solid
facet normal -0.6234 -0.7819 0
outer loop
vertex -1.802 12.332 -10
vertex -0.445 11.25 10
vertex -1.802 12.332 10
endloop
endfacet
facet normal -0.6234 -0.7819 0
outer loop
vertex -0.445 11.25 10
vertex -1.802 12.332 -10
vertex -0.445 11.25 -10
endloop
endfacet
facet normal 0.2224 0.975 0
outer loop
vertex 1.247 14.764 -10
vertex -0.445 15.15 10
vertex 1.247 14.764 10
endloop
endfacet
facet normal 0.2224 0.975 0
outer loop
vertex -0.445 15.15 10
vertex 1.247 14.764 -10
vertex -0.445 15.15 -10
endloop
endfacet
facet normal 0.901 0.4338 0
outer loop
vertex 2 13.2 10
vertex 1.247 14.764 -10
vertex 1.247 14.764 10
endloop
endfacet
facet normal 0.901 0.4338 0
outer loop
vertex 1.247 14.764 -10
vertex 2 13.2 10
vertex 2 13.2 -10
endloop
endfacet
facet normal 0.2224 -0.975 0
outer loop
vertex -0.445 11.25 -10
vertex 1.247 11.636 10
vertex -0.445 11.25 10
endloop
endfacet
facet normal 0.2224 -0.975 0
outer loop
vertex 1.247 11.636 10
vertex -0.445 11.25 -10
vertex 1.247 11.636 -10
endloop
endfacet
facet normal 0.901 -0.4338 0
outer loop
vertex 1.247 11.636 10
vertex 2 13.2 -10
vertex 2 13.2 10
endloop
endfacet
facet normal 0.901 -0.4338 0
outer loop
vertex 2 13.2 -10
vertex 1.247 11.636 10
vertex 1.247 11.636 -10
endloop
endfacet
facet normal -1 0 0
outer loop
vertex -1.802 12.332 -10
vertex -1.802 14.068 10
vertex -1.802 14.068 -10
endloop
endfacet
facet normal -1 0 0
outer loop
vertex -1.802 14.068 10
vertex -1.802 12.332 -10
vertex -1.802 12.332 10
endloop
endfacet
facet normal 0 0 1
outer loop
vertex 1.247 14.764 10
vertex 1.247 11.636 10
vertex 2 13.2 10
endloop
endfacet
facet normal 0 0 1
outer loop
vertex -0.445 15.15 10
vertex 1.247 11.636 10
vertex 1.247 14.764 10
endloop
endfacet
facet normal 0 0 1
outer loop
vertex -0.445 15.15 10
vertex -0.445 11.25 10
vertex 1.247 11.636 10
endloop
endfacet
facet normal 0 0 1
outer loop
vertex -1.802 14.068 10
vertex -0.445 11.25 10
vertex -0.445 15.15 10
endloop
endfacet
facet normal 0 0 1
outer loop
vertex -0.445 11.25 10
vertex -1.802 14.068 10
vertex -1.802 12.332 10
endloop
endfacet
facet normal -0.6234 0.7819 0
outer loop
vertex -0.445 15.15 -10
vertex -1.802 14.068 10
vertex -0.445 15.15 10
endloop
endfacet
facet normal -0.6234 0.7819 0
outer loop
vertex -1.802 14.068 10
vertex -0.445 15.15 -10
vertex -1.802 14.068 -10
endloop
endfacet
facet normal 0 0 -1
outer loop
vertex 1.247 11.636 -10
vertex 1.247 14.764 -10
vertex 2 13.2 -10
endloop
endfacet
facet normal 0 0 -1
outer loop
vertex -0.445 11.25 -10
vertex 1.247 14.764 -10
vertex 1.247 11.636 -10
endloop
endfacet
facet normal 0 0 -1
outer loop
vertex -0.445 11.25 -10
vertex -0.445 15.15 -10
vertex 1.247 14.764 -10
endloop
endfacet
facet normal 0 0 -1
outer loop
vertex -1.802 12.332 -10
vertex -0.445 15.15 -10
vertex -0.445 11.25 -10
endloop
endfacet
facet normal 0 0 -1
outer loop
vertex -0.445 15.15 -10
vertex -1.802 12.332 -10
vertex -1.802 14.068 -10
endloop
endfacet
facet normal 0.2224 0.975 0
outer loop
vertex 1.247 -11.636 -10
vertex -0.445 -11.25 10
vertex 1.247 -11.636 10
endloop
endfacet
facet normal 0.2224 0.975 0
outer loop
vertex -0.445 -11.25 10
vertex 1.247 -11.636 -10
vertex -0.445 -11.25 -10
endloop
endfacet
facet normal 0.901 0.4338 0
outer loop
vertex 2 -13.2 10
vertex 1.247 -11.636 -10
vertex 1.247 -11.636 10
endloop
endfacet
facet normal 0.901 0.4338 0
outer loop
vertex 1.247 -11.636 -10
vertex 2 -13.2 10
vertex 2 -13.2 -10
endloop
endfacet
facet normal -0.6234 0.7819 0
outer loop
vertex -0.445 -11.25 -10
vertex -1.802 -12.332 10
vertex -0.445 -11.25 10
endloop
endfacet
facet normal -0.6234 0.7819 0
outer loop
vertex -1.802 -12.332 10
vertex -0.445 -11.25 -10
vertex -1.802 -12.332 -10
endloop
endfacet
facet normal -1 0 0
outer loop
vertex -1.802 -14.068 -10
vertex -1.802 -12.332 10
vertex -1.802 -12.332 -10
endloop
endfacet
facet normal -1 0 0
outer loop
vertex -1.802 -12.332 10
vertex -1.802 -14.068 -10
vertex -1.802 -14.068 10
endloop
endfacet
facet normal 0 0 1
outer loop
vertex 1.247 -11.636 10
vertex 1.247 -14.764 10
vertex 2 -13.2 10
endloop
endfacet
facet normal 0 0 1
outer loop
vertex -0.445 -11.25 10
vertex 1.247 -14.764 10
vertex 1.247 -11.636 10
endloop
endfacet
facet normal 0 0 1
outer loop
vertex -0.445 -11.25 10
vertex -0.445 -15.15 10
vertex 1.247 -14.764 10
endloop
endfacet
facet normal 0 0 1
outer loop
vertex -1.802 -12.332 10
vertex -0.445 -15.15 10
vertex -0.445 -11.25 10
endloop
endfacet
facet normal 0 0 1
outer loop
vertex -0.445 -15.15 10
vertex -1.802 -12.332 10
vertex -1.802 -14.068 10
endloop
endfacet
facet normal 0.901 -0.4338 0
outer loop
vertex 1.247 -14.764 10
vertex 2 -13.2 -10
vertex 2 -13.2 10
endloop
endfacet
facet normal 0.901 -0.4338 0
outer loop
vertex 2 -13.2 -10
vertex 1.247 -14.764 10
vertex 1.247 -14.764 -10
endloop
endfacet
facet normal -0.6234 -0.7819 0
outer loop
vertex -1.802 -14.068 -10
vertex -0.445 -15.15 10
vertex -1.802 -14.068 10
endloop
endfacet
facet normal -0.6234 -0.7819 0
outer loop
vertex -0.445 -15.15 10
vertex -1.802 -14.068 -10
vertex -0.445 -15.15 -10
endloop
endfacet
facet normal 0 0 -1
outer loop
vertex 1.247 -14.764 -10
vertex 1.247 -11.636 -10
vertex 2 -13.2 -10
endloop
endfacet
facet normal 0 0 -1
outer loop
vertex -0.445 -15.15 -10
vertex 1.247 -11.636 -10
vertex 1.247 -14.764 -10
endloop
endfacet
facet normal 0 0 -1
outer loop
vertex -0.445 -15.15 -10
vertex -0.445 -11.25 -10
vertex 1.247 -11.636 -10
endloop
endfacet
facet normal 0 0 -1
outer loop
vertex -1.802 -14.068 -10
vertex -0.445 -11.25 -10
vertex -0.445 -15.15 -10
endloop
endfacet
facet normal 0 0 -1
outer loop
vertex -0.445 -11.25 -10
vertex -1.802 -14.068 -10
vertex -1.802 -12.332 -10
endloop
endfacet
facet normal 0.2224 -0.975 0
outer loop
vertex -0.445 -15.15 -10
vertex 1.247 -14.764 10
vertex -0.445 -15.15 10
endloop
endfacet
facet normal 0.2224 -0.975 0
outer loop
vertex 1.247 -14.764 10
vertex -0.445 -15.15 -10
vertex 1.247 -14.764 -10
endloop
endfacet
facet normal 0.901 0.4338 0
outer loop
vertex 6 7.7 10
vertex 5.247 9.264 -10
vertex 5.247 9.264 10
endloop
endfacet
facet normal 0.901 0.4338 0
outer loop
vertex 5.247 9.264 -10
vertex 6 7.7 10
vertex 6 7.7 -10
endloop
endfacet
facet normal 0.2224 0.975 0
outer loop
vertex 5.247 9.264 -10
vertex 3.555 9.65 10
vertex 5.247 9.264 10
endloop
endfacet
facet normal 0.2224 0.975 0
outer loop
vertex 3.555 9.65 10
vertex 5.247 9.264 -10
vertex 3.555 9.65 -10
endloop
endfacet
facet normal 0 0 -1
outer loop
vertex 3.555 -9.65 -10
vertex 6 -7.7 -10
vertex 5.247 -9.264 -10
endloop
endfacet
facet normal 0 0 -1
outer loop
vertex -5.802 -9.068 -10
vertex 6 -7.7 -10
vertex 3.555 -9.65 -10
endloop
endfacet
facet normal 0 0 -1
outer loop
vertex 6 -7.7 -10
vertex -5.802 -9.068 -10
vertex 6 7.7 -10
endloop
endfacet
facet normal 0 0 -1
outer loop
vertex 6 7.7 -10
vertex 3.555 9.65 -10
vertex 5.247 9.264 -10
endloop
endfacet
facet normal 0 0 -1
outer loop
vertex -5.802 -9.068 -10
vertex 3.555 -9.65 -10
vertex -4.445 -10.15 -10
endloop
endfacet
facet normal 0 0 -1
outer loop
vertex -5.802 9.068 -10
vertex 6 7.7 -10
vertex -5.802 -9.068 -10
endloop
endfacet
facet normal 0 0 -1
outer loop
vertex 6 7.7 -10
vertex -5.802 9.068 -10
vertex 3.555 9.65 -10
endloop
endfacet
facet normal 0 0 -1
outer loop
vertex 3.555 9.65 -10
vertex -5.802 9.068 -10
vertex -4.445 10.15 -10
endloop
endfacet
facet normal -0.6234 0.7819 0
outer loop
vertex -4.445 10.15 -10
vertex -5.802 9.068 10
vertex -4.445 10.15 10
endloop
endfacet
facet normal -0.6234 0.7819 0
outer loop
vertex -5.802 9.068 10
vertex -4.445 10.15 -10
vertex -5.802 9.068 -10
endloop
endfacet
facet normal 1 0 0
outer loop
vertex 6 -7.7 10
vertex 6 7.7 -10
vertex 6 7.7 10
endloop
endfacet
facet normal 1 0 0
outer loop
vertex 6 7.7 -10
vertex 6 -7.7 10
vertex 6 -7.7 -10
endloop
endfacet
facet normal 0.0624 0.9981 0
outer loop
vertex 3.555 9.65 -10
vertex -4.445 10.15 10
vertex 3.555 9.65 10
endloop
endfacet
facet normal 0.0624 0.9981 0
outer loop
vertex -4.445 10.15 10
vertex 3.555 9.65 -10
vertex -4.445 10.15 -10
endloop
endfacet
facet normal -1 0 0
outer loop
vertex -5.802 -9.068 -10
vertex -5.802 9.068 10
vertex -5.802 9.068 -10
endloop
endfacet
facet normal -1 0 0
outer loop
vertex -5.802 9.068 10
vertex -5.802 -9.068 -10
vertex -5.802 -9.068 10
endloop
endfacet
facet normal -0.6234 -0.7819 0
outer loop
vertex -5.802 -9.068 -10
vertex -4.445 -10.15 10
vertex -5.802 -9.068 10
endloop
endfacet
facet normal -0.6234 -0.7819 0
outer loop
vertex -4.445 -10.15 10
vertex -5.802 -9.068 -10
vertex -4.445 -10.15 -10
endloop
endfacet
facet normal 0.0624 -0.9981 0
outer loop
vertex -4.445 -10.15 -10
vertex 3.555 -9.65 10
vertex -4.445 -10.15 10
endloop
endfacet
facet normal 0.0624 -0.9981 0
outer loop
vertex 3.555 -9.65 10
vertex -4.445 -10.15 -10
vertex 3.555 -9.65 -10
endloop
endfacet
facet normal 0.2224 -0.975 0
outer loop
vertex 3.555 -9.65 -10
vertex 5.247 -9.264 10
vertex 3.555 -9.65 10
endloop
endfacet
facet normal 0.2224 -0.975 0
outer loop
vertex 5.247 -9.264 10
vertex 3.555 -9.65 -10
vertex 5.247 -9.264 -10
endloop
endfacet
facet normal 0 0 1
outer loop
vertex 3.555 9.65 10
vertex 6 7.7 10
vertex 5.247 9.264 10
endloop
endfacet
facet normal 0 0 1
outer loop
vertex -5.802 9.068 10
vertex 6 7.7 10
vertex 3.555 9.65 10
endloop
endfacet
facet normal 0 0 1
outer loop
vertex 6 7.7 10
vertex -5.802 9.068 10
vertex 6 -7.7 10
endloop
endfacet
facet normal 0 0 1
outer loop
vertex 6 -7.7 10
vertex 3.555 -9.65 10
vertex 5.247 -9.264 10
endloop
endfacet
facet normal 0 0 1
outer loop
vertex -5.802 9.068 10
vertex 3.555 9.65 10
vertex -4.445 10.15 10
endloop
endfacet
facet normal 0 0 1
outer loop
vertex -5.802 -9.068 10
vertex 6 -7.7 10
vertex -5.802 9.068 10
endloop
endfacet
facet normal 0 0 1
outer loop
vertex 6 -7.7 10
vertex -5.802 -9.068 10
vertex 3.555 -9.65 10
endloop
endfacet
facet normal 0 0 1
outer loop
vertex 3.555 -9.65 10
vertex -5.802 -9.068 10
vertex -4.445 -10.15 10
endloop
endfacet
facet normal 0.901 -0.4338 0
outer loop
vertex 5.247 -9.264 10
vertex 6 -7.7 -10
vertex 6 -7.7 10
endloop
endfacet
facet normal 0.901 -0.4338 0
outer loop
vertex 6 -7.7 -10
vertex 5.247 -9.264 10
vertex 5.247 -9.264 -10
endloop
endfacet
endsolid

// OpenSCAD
// preview[view:north east, tilt:top]


/* [Cutout] */

// Type of cut out
dbType = "DB09"; //[DB09, VGA, DB15, DB25]

// Screw hole type
ScrewHoleType = "HOLE"; //[HOLE, SLOT, BigSlot]

// Cutout Heigth
CutoutHeight = 20; //[1:50]

/* [Options] */

// Genrate Cutout
GenerateDbCutout = "Yes"; //[Yes, No]

// Tiedown Support Pins. Normaly you will want to generate these seperate from the cutout.
GenerateSupportPins = "No"; //[Yes, No]

// Tie Down straps. Normaly you will generate these on there own.
GenerateTieDownSraps = "No"; //[Yes, No]

cutoutDB(dbType, ScrewHoleType, GenerateDbCutout, GenerateSupportPins);

/* [About] */
// This is meant to be a library for DB and DE connectors. If you have any sugestion feel free to send me a message.
About = ""; //[]





/* [Hidden] */

//$fn=40;


//
// inType DB09,15,25,VGA
//
// inScrewHoleType HOLE, SLOT
//



/*
cutoutDB09vga("SLOT");
translate([15,0,0]) cutoutDB09vga("HOLE");

translate([30,0,0]) cutoutDB15("SLOT");
translate([45,0,0]) cutoutDB15("HOLE");

translate([60,0,0]) cutoutDB25("SLOT");
translate([75,0,0]) cutoutDB25("HOLE");

*/

if(GenerateTieDownSraps == "Yes"){
	holdDownStraps();
}
module cutoutDB(inType, inScrewHoleType, wGenerateDbCutout, wGenerateSupportPins){
	
	//wGenerateDbCutout = "" ? "Yes" : "No" ;
	//wGenerateSupportPins = "" ? "No" : "Yes" ;
	
	if(inType == "DB09" || inType == "VGA"){
		cutoutDB09vga(inScrewHoleType, wGenerateDbCutout, wGenerateSupportPins);
	} else if(inType == "DB15"){
		cutoutDB15(inScrewHoleType, wGenerateDbCutout, wGenerateSupportPins);
	} else if(inType == "DB25"){
		cutoutDB25(inScrewHoleType, wGenerateDbCutout, wGenerateSupportPins);
	}
}

module cutoutDB09vga(inScreewHoleType, wGenerateDbCutout, wGenerateSupportPins){
	holeWidth = 8.2;
	HoleHeight = 4;	
	cutoutDBx(holeWidth, HoleHeight, inScreewHoleType, wGenerateDbCutout, wGenerateSupportPins);
}
module cutoutDB15(inScreewHoleType, wGenerateDbCutout, wGenerateSupportPins){
	holeWidth = 16;
	HoleHeight = 4;	
	cutoutDBx(holeWidth, HoleHeight, inScreewHoleType, wGenerateDbCutout, wGenerateSupportPins);
}
module cutoutDB25(inScreewHoleType, wGenerateDbCutout, wGenerateSupportPins){
	holeWidth = 19.6;
	HoleHeight = 4;	
	cutoutDBx(holeWidth, HoleHeight, inScreewHoleType, wGenerateDbCutout, wGenerateSupportPins);
}
module cutoutDBx(inHoleWidth, inHoleHeight, inScreewHoleType, wGenerateDbCutout, wGenerateSupportPins){
	screwHoleWidth = inHoleWidth + 5;
	if(wGenerateDbCutout == "Yes"){
		hull(){
			translate([-inHoleHeight, inHoleWidth,  		0]) cylinder(h = CutoutHeight, d = 4, center = true); // upper right
			translate([-inHoleHeight, -inHoleWidth, 		0]) cylinder(h = CutoutHeight, d = 4, center = true); // upper left
			translate([inHoleHeight,  inHoleWidth  -.5, 0]) cylinder(h = CutoutHeight, d = 4, center = true); // lower right
			translate([inHoleHeight,  -inHoleWidth +.5, 0]) cylinder(h = CutoutHeight, d = 4, center = true); // lower left
		}
		holeDiamiter = 4;
		if(inScreewHoleType == "HOLE"){
			translate([0,  screwHoleWidth,0]) cylinder(h = CutoutHeight, d = holeDiamiter, center = true);
			translate([0, -screwHoleWidth,0]) cylinder(h = CutoutHeight, d = holeDiamiter, center = true);
		} else if(inScreewHoleType == "SLOT"){
			holeDiamiter = 4 ;
			hull(){
				translate([0,  screwHoleWidth,0]) cylinder(h = CutoutHeight, d = holeDiamiter, center = true);
				translate([0, -screwHoleWidth,0]) cylinder(h = CutoutHeight, d = holeDiamiter, center = true);
			}
		}	else {
			holeDiamiter = 6 ;
			hull(){
				translate([0,  screwHoleWidth,0]) cylinder(h = CutoutHeight, d = holeDiamiter, center = true);
				translate([0, -screwHoleWidth,0]) cylinder(h = CutoutHeight, d = holeDiamiter, center = true);
			}	
		}
	}
	placeSupportPins(screwHoleWidth, wGenerateSupportPins);
}
module placeSupportPins(screwHoleWidth, wGenerateSupportPins){
	if(wGenerateSupportPins == "Yes" ){
		translate([12,screwHoleWidth,0]) supportPins();
		translate([12,-screwHoleWidth,0]) supportPins();
		translate([-12,screwHoleWidth,0]) supportPins();
		translate([-12,-screwHoleWidth,0]) supportPins();
	}
}
module supportPins(){
		difference(){
			hull(){
				cube([8,12,.1], center=true);
				translate([0,0,3]) cube([5,5,.1], center=true);
			}
			translate([0,0,4]) cylinder(h = 4, d = 2, center = true);
		}
}

module holdDownStraps(){
	translate([0,-5,0]) rotate([90,0,0]) holdDownStrap();
	translate([0,+5,0]) rotate([90,0,0]) holdDownStrap();
}

module holdDownStrap(){
	difference(){
		cube([34,5,2], center=true);
		translate([12,0,0]) cylinder(h = 6, d = 2, center = true);
		translate([-12,0,0]) cylinder(h = 6, d = 2, center = true);
	}
}

translate([15,0,0]) cutoutDB09vga("HOLE");
